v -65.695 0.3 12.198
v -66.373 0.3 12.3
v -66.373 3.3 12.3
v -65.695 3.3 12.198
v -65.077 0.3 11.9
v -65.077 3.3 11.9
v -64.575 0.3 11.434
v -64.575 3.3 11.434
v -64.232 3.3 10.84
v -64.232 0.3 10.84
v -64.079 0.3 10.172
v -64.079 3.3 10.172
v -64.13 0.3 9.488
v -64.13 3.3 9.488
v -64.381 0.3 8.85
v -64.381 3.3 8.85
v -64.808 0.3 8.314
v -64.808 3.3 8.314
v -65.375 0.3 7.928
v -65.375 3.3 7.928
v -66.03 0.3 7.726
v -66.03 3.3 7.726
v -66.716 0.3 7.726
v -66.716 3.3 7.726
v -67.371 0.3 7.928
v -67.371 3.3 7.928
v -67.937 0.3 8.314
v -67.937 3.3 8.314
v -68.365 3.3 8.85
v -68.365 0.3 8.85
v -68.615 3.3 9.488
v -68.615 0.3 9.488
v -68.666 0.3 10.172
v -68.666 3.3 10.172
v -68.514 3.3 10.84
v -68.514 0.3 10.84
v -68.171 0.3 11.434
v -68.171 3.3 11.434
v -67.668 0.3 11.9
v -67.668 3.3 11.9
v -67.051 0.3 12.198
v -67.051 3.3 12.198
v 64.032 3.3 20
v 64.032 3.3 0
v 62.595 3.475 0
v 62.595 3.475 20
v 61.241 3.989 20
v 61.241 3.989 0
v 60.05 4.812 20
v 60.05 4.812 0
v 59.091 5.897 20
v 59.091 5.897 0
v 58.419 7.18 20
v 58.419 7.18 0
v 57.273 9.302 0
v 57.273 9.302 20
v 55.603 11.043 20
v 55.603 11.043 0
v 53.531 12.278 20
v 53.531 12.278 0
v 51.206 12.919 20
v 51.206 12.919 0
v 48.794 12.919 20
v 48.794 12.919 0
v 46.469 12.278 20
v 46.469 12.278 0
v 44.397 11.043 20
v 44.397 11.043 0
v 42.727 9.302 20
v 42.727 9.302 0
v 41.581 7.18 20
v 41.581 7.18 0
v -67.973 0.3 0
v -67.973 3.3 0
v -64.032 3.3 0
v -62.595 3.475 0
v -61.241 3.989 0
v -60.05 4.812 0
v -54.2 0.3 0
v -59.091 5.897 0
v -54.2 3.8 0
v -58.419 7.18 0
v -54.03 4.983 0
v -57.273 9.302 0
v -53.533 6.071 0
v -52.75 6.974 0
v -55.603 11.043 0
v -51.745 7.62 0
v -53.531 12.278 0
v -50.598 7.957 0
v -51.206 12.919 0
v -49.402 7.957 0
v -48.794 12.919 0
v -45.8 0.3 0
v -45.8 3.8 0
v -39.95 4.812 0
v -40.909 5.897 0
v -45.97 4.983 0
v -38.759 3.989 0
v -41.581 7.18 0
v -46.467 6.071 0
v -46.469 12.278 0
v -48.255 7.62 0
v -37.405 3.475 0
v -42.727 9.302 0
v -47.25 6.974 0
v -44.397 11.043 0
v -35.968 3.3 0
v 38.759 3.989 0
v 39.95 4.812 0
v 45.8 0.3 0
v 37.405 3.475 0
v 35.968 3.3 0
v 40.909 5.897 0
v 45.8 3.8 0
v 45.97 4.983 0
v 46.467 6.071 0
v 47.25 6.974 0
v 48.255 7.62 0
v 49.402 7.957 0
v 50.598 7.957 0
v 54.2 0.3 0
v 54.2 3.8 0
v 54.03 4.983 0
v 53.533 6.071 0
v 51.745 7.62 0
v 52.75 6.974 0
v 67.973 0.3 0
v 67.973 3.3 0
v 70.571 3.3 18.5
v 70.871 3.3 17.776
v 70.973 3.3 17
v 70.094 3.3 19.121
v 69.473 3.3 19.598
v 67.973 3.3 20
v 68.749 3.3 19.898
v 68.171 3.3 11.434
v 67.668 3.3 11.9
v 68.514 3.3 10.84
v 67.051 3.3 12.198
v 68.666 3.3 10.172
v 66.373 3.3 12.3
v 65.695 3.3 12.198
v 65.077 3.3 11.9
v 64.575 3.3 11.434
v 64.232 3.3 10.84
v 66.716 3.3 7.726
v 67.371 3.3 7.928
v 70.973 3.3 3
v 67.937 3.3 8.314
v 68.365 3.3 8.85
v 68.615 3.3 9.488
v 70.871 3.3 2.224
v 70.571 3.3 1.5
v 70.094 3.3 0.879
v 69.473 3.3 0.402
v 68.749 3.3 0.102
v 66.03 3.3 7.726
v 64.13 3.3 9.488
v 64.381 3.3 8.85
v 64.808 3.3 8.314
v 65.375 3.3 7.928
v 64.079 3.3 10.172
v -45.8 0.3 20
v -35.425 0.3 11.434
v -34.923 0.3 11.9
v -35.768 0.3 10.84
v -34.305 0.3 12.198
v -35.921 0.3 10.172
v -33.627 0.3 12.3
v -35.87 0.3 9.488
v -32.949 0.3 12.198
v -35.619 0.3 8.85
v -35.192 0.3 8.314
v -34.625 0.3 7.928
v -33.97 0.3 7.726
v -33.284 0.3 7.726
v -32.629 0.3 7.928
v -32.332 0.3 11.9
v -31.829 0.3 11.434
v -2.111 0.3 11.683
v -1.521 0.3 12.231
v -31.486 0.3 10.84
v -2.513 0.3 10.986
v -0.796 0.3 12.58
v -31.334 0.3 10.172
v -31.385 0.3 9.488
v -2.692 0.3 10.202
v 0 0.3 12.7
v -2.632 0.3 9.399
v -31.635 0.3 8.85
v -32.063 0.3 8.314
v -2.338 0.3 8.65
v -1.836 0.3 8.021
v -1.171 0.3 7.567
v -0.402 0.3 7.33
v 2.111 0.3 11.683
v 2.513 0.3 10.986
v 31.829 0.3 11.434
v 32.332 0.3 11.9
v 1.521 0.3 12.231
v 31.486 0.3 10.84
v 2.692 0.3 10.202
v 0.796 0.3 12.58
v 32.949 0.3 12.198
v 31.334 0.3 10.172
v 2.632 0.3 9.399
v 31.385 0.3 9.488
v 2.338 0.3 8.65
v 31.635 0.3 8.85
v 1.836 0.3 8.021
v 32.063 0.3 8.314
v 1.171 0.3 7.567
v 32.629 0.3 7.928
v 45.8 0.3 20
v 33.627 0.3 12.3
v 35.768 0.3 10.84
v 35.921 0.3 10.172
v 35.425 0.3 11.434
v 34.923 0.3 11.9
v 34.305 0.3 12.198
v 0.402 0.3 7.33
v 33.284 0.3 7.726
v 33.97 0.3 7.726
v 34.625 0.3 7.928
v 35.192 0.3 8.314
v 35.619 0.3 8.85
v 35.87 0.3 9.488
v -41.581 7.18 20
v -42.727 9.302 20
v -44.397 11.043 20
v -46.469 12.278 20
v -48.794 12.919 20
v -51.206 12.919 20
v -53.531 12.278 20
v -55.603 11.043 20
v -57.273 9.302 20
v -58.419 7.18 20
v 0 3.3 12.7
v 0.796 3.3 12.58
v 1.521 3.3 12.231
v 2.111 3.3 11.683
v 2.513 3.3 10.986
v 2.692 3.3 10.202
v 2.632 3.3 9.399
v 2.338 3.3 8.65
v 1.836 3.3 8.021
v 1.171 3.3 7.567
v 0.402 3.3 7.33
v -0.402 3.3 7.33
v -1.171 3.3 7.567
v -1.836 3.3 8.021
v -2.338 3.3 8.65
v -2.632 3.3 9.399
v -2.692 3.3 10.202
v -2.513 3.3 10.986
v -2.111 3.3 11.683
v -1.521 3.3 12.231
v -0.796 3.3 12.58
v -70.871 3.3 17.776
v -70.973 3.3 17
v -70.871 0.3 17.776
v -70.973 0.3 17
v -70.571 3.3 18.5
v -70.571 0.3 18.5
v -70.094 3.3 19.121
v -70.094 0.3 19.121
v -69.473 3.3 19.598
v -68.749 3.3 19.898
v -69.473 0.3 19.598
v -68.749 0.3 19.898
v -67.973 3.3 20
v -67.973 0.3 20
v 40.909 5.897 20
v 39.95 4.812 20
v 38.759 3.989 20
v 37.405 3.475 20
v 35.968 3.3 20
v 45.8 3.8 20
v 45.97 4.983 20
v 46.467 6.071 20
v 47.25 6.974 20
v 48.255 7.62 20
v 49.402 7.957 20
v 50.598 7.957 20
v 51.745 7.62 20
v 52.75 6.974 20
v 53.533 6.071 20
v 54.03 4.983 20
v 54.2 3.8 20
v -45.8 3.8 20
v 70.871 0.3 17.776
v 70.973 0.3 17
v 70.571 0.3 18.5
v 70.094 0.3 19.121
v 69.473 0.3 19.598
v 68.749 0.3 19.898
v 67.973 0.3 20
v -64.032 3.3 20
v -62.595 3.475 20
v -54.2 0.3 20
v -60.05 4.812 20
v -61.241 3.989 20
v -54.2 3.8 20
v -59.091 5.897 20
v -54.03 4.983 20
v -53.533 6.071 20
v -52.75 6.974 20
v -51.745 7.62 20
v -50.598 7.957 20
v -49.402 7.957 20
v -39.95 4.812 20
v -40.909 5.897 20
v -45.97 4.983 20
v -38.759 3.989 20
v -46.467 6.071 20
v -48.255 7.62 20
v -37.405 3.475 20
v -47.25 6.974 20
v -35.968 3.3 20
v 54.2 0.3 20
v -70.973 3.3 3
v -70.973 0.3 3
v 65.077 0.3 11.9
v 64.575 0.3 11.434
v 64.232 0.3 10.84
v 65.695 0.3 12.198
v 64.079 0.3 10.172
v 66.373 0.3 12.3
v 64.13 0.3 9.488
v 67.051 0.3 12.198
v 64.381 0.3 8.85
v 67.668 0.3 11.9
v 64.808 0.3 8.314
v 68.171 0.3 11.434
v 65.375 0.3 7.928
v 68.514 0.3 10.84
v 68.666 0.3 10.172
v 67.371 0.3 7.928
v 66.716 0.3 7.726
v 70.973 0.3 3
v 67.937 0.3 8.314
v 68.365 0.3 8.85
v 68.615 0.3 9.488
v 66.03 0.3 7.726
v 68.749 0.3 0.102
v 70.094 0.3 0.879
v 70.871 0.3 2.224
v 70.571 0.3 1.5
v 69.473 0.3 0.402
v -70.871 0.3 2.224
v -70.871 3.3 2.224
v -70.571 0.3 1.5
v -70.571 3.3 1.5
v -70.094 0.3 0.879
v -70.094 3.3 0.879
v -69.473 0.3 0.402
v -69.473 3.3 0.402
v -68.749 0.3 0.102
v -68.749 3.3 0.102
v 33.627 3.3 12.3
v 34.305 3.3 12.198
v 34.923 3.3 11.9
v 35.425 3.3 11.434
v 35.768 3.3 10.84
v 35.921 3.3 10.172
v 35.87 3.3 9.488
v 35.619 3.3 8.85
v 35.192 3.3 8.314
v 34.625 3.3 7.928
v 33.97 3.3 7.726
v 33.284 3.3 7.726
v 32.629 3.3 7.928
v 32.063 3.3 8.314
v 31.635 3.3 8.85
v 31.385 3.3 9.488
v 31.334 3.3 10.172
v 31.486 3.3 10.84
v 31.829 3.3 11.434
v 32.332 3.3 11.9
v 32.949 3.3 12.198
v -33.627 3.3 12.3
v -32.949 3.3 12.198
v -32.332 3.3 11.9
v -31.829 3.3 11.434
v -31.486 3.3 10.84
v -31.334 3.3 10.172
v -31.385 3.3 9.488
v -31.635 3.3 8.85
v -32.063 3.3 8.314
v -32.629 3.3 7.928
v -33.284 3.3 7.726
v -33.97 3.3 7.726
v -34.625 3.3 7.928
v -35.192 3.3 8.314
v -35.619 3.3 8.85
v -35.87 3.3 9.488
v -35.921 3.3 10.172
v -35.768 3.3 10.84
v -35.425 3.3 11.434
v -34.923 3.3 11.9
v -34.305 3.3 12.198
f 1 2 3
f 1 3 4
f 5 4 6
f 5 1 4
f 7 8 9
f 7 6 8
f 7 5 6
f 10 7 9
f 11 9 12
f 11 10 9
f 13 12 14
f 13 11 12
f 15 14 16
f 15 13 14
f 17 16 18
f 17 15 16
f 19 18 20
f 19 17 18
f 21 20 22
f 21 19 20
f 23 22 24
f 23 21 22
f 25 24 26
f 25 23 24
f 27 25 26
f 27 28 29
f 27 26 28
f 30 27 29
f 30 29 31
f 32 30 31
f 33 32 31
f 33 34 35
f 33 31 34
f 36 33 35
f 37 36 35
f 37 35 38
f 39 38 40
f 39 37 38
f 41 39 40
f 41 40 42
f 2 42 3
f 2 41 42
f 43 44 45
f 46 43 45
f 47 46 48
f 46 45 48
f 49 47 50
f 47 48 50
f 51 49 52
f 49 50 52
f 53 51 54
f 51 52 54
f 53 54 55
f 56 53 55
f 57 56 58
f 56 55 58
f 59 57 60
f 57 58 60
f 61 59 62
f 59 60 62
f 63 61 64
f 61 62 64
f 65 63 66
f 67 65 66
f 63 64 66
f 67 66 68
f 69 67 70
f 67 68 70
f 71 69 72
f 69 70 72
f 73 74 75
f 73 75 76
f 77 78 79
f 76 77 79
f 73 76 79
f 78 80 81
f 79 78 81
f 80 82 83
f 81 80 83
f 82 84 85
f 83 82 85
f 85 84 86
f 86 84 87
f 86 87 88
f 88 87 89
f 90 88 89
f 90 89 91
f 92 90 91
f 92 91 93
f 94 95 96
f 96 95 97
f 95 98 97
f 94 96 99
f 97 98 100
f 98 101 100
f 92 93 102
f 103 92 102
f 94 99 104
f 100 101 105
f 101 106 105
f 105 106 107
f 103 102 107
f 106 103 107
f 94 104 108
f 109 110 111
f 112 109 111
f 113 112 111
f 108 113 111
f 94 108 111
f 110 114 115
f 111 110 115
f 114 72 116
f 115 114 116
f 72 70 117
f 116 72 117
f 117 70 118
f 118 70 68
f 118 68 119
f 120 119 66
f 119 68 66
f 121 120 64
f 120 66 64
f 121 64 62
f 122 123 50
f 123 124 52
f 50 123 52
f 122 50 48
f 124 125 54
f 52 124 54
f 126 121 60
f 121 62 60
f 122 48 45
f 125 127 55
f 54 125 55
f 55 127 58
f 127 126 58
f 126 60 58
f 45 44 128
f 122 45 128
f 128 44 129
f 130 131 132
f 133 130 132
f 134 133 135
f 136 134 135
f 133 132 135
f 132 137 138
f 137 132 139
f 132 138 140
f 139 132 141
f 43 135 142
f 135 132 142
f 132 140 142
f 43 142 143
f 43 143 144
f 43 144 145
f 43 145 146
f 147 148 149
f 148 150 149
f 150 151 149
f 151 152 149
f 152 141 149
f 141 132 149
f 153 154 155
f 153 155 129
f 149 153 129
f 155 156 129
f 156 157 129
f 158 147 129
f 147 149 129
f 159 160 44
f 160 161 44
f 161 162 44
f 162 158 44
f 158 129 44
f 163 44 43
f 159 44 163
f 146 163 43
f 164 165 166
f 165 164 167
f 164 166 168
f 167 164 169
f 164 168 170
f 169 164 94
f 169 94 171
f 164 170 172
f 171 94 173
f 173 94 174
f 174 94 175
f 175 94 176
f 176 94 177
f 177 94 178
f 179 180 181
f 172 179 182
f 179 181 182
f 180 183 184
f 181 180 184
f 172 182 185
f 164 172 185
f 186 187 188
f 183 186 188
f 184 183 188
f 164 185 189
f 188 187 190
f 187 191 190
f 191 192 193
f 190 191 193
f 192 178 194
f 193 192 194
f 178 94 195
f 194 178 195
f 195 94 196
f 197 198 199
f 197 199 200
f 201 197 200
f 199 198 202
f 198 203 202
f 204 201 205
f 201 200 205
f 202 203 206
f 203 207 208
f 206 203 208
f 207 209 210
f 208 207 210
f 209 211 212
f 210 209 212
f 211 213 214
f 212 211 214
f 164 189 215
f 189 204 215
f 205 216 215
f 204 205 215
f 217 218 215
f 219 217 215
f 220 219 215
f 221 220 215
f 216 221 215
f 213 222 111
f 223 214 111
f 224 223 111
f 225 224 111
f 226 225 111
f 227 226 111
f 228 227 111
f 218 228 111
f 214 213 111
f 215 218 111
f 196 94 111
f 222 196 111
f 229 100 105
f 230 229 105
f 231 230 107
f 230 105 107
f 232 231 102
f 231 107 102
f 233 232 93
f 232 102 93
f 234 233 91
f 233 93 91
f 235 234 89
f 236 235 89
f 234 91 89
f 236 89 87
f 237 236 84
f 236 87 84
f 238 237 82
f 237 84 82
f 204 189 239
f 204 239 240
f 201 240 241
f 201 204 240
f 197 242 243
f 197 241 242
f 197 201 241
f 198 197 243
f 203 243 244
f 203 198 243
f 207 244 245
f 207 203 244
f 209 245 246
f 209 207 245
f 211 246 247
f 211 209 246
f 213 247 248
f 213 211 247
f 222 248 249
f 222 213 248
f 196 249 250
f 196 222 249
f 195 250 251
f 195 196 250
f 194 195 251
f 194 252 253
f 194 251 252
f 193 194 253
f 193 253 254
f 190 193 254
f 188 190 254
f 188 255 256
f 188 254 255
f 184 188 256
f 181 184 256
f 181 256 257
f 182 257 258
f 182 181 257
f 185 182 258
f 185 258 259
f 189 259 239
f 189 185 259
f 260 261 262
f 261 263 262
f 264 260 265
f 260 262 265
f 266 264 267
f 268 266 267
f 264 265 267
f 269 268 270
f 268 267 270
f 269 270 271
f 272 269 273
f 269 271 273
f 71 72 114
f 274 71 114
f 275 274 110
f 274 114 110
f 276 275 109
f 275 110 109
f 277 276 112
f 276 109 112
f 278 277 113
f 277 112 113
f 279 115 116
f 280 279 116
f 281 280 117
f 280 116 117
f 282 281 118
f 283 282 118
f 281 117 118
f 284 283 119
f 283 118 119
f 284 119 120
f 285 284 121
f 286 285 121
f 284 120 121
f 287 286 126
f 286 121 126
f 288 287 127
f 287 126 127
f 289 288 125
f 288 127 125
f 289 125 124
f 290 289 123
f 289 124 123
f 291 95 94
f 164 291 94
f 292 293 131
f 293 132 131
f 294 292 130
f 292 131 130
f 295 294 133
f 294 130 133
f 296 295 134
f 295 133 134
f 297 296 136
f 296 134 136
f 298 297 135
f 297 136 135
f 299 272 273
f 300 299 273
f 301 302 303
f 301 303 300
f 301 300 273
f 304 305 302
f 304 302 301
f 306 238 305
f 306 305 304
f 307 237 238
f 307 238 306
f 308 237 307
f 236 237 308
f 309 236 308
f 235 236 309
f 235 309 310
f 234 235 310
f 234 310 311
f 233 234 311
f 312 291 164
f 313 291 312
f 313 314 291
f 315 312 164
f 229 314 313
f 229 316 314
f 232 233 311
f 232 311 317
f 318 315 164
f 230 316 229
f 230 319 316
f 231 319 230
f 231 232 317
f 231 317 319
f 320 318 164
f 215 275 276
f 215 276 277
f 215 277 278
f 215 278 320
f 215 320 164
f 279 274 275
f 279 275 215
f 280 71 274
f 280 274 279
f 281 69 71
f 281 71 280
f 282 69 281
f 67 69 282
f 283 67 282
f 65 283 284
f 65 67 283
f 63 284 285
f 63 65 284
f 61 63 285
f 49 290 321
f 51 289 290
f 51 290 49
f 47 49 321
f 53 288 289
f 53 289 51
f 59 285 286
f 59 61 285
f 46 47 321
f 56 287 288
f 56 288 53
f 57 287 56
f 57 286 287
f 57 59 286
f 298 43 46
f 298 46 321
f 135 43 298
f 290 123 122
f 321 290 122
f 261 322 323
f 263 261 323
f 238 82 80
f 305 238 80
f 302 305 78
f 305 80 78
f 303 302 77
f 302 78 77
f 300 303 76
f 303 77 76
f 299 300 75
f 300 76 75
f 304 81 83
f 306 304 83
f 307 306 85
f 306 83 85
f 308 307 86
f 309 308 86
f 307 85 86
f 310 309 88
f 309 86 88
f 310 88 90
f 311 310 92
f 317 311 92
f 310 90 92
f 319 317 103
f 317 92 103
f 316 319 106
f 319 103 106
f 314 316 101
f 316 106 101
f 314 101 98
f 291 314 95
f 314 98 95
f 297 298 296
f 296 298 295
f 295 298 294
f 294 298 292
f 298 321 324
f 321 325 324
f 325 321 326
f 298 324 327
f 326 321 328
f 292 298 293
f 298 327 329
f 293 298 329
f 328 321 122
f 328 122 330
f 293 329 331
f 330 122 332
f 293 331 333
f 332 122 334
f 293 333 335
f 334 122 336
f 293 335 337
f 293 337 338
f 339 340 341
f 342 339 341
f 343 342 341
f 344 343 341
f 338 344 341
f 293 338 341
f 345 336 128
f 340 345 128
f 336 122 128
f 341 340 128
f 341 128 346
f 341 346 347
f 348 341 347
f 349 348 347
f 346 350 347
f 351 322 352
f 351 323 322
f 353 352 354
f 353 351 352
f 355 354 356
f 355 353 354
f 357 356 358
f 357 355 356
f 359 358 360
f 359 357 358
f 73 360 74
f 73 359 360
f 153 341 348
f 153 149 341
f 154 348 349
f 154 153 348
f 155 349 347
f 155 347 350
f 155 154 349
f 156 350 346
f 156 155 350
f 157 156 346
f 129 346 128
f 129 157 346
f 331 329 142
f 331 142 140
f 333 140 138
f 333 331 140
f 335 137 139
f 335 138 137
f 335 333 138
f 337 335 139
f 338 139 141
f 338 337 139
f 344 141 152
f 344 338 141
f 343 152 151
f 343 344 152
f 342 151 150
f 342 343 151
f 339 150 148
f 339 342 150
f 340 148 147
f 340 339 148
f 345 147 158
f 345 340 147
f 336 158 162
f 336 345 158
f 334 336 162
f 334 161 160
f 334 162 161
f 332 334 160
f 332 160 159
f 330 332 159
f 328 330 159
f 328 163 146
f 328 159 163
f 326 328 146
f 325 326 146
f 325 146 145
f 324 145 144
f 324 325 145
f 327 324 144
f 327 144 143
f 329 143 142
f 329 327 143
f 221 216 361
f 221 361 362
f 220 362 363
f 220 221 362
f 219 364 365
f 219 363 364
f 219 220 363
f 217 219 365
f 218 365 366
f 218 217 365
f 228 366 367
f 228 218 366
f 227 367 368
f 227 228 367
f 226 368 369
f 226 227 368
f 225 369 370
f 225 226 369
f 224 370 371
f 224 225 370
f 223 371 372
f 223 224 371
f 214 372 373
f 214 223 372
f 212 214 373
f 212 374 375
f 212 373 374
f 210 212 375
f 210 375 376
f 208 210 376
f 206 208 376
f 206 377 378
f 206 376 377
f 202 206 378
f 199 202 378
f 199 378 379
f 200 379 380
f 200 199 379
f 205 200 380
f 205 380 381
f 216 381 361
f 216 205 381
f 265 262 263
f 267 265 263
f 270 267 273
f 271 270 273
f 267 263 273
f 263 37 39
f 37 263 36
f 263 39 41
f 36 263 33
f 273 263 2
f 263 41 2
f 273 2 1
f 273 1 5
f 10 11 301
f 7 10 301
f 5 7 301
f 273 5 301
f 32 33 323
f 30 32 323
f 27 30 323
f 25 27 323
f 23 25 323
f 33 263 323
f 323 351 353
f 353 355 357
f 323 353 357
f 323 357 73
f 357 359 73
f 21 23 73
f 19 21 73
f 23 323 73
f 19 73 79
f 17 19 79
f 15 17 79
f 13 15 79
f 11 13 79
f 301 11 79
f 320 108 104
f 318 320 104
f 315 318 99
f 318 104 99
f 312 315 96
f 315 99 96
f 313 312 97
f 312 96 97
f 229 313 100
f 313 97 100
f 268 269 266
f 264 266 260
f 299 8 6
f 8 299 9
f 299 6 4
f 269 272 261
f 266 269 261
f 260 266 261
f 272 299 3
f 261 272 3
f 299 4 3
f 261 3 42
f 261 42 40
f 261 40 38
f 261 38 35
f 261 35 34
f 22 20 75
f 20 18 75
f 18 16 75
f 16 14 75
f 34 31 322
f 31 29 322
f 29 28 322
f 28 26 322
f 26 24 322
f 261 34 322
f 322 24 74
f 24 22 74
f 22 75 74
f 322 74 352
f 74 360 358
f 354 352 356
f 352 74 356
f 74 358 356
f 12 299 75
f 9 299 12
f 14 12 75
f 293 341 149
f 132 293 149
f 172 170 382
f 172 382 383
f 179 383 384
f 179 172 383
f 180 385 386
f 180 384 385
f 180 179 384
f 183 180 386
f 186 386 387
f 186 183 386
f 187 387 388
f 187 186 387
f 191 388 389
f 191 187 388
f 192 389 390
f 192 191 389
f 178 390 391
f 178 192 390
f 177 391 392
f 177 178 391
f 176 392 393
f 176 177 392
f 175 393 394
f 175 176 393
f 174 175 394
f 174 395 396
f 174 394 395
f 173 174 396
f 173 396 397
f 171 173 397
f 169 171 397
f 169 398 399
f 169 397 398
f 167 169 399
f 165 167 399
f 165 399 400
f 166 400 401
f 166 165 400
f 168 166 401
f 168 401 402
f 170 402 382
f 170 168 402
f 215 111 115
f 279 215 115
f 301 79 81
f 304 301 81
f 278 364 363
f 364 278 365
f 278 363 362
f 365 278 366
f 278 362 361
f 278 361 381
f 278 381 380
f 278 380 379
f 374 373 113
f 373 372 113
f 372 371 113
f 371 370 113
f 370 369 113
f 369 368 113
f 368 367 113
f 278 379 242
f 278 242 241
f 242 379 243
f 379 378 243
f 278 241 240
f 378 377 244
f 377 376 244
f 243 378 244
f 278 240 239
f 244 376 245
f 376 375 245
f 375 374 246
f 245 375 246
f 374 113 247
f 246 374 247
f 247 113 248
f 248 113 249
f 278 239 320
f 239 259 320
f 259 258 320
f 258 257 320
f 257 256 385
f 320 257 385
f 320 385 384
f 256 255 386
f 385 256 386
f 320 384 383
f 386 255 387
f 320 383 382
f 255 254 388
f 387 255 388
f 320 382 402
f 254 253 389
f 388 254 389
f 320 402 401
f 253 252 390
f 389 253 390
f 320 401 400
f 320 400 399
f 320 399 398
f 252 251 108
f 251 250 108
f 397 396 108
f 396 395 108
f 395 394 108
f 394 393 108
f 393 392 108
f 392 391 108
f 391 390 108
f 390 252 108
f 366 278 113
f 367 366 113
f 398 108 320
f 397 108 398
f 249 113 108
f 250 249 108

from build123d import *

# Parameters (mm, degrees)
EXTRUDE_1_DEPTH          = 20
FILLET_1_R               = 3
CUT_EXTRUDE_1_DEPTH      = 75.37216767
CUT_EXTRUDE_1_DEPTH_BACK = 75.37216767
SKETCH_2_R               = 2.7
SKETCH_2_R_2             = 2.3


with BuildPart() as part:
    # 草图1 → 凸台-拉伸1 (new body)
    with BuildSketch(Plane.XY):
        with BuildLine():
            Line((54.2, 3.8), (54.2, 0.3))
            Line((54.2, 0.3), (70.972736483, 0.3))
            Line((70.972736483, 0.3), (70.972736483, 3.3))
            Line((70.972736483, 3.3), (64.032462364, 3.3))
            ThreePointArc((64.032462364, 3.3), (60.620717942, 4.364414928), (58.419477418, 7.18))
            ThreePointArc((58.419477418, 7.18), (50, 13), (41.580522582, 7.18))
            ThreePointArc((41.580522582, 7.18), (39.379282058, 4.364414928), (35.967537636, 3.3))
            Line((35.967537636, 3.3), (-35.967537636, 3.3))
            ThreePointArc((-35.967537636, 3.3), (-39.379282058, 4.364414928), (-41.580522582, 7.18))
            ThreePointArc((-41.580522582, 7.18), (-50, 13), (-58.419477418, 7.18))
            ThreePointArc((-58.419477418, 7.18), (-60.620717942, 4.364414928), (-64.032462364, 3.3))
            Line((-64.032462364, 3.3), (-70.972736483, 3.3))
            Line((-70.972736483, 3.3), (-70.972736483, 0.3))
            Line((-70.972736483, 0.3), (-54.2, 0.3))
            Line((-54.2, 0.3), (-54.2, 3.8))
            ThreePointArc((-54.2, 3.8), (-50, 8), (-45.8, 3.8))
            Line((-45.8, 3.8), (-45.8, 0.3))
            Line((-45.8, 0.3), (45.8, 0.3))
            Line((45.8, 0.3), (45.8, 3.8))
            ThreePointArc((45.8, 3.8), (50, 8), (54.2, 3.8))
        make_face()
    extrude(amount=EXTRUDE_1_DEPTH)

    # 圆角1
    fillet_1_edges = [part.edges().sort_by_distance(p)[0] for p in [
        (70.972736483, 1.8, 20),
        (-70.972736483, 1.8, 0),
        (70.972736483, 1.8, 0),
        (-70.972736483, 1.8, 20),
    ]]
    fillet(fillet_1_edges, radius=FILLET_1_R)

    # 草图2 → 切除-拉伸1 (cut, two sides: drawn at the far end of the back side and taken through both)
    with BuildSketch(Plane(origin=(0, 3.3, 0), x_dir=(1, 0, 0), z_dir=(0, 1, 0)).offset(-CUT_EXTRUDE_1_DEPTH_BACK)):
        with Locations(Location((0, -10, 0), (0, 0, 270))):
            Circle(SKETCH_2_R)
        with Locations(Location((66.372736483, -10, 0), (0, 0, 270))):
            Circle(SKETCH_2_R_2)
        with Locations(Location((33.627263517, -10, 0), (0, 0, 270))):
            Circle(SKETCH_2_R_2)
        with Locations(Location((-33.627263517, -10, 0), (0, 0, 270))):
            Circle(SKETCH_2_R_2)
        with Locations(Location((-66.372736483, -10, 0), (0, 0, 270))):
            Circle(SKETCH_2_R_2)
    extrude(amount=CUT_EXTRUDE_1_DEPTH + CUT_EXTRUDE_1_DEPTH_BACK, mode=Mode.SUBTRACT)


solid = part.part
